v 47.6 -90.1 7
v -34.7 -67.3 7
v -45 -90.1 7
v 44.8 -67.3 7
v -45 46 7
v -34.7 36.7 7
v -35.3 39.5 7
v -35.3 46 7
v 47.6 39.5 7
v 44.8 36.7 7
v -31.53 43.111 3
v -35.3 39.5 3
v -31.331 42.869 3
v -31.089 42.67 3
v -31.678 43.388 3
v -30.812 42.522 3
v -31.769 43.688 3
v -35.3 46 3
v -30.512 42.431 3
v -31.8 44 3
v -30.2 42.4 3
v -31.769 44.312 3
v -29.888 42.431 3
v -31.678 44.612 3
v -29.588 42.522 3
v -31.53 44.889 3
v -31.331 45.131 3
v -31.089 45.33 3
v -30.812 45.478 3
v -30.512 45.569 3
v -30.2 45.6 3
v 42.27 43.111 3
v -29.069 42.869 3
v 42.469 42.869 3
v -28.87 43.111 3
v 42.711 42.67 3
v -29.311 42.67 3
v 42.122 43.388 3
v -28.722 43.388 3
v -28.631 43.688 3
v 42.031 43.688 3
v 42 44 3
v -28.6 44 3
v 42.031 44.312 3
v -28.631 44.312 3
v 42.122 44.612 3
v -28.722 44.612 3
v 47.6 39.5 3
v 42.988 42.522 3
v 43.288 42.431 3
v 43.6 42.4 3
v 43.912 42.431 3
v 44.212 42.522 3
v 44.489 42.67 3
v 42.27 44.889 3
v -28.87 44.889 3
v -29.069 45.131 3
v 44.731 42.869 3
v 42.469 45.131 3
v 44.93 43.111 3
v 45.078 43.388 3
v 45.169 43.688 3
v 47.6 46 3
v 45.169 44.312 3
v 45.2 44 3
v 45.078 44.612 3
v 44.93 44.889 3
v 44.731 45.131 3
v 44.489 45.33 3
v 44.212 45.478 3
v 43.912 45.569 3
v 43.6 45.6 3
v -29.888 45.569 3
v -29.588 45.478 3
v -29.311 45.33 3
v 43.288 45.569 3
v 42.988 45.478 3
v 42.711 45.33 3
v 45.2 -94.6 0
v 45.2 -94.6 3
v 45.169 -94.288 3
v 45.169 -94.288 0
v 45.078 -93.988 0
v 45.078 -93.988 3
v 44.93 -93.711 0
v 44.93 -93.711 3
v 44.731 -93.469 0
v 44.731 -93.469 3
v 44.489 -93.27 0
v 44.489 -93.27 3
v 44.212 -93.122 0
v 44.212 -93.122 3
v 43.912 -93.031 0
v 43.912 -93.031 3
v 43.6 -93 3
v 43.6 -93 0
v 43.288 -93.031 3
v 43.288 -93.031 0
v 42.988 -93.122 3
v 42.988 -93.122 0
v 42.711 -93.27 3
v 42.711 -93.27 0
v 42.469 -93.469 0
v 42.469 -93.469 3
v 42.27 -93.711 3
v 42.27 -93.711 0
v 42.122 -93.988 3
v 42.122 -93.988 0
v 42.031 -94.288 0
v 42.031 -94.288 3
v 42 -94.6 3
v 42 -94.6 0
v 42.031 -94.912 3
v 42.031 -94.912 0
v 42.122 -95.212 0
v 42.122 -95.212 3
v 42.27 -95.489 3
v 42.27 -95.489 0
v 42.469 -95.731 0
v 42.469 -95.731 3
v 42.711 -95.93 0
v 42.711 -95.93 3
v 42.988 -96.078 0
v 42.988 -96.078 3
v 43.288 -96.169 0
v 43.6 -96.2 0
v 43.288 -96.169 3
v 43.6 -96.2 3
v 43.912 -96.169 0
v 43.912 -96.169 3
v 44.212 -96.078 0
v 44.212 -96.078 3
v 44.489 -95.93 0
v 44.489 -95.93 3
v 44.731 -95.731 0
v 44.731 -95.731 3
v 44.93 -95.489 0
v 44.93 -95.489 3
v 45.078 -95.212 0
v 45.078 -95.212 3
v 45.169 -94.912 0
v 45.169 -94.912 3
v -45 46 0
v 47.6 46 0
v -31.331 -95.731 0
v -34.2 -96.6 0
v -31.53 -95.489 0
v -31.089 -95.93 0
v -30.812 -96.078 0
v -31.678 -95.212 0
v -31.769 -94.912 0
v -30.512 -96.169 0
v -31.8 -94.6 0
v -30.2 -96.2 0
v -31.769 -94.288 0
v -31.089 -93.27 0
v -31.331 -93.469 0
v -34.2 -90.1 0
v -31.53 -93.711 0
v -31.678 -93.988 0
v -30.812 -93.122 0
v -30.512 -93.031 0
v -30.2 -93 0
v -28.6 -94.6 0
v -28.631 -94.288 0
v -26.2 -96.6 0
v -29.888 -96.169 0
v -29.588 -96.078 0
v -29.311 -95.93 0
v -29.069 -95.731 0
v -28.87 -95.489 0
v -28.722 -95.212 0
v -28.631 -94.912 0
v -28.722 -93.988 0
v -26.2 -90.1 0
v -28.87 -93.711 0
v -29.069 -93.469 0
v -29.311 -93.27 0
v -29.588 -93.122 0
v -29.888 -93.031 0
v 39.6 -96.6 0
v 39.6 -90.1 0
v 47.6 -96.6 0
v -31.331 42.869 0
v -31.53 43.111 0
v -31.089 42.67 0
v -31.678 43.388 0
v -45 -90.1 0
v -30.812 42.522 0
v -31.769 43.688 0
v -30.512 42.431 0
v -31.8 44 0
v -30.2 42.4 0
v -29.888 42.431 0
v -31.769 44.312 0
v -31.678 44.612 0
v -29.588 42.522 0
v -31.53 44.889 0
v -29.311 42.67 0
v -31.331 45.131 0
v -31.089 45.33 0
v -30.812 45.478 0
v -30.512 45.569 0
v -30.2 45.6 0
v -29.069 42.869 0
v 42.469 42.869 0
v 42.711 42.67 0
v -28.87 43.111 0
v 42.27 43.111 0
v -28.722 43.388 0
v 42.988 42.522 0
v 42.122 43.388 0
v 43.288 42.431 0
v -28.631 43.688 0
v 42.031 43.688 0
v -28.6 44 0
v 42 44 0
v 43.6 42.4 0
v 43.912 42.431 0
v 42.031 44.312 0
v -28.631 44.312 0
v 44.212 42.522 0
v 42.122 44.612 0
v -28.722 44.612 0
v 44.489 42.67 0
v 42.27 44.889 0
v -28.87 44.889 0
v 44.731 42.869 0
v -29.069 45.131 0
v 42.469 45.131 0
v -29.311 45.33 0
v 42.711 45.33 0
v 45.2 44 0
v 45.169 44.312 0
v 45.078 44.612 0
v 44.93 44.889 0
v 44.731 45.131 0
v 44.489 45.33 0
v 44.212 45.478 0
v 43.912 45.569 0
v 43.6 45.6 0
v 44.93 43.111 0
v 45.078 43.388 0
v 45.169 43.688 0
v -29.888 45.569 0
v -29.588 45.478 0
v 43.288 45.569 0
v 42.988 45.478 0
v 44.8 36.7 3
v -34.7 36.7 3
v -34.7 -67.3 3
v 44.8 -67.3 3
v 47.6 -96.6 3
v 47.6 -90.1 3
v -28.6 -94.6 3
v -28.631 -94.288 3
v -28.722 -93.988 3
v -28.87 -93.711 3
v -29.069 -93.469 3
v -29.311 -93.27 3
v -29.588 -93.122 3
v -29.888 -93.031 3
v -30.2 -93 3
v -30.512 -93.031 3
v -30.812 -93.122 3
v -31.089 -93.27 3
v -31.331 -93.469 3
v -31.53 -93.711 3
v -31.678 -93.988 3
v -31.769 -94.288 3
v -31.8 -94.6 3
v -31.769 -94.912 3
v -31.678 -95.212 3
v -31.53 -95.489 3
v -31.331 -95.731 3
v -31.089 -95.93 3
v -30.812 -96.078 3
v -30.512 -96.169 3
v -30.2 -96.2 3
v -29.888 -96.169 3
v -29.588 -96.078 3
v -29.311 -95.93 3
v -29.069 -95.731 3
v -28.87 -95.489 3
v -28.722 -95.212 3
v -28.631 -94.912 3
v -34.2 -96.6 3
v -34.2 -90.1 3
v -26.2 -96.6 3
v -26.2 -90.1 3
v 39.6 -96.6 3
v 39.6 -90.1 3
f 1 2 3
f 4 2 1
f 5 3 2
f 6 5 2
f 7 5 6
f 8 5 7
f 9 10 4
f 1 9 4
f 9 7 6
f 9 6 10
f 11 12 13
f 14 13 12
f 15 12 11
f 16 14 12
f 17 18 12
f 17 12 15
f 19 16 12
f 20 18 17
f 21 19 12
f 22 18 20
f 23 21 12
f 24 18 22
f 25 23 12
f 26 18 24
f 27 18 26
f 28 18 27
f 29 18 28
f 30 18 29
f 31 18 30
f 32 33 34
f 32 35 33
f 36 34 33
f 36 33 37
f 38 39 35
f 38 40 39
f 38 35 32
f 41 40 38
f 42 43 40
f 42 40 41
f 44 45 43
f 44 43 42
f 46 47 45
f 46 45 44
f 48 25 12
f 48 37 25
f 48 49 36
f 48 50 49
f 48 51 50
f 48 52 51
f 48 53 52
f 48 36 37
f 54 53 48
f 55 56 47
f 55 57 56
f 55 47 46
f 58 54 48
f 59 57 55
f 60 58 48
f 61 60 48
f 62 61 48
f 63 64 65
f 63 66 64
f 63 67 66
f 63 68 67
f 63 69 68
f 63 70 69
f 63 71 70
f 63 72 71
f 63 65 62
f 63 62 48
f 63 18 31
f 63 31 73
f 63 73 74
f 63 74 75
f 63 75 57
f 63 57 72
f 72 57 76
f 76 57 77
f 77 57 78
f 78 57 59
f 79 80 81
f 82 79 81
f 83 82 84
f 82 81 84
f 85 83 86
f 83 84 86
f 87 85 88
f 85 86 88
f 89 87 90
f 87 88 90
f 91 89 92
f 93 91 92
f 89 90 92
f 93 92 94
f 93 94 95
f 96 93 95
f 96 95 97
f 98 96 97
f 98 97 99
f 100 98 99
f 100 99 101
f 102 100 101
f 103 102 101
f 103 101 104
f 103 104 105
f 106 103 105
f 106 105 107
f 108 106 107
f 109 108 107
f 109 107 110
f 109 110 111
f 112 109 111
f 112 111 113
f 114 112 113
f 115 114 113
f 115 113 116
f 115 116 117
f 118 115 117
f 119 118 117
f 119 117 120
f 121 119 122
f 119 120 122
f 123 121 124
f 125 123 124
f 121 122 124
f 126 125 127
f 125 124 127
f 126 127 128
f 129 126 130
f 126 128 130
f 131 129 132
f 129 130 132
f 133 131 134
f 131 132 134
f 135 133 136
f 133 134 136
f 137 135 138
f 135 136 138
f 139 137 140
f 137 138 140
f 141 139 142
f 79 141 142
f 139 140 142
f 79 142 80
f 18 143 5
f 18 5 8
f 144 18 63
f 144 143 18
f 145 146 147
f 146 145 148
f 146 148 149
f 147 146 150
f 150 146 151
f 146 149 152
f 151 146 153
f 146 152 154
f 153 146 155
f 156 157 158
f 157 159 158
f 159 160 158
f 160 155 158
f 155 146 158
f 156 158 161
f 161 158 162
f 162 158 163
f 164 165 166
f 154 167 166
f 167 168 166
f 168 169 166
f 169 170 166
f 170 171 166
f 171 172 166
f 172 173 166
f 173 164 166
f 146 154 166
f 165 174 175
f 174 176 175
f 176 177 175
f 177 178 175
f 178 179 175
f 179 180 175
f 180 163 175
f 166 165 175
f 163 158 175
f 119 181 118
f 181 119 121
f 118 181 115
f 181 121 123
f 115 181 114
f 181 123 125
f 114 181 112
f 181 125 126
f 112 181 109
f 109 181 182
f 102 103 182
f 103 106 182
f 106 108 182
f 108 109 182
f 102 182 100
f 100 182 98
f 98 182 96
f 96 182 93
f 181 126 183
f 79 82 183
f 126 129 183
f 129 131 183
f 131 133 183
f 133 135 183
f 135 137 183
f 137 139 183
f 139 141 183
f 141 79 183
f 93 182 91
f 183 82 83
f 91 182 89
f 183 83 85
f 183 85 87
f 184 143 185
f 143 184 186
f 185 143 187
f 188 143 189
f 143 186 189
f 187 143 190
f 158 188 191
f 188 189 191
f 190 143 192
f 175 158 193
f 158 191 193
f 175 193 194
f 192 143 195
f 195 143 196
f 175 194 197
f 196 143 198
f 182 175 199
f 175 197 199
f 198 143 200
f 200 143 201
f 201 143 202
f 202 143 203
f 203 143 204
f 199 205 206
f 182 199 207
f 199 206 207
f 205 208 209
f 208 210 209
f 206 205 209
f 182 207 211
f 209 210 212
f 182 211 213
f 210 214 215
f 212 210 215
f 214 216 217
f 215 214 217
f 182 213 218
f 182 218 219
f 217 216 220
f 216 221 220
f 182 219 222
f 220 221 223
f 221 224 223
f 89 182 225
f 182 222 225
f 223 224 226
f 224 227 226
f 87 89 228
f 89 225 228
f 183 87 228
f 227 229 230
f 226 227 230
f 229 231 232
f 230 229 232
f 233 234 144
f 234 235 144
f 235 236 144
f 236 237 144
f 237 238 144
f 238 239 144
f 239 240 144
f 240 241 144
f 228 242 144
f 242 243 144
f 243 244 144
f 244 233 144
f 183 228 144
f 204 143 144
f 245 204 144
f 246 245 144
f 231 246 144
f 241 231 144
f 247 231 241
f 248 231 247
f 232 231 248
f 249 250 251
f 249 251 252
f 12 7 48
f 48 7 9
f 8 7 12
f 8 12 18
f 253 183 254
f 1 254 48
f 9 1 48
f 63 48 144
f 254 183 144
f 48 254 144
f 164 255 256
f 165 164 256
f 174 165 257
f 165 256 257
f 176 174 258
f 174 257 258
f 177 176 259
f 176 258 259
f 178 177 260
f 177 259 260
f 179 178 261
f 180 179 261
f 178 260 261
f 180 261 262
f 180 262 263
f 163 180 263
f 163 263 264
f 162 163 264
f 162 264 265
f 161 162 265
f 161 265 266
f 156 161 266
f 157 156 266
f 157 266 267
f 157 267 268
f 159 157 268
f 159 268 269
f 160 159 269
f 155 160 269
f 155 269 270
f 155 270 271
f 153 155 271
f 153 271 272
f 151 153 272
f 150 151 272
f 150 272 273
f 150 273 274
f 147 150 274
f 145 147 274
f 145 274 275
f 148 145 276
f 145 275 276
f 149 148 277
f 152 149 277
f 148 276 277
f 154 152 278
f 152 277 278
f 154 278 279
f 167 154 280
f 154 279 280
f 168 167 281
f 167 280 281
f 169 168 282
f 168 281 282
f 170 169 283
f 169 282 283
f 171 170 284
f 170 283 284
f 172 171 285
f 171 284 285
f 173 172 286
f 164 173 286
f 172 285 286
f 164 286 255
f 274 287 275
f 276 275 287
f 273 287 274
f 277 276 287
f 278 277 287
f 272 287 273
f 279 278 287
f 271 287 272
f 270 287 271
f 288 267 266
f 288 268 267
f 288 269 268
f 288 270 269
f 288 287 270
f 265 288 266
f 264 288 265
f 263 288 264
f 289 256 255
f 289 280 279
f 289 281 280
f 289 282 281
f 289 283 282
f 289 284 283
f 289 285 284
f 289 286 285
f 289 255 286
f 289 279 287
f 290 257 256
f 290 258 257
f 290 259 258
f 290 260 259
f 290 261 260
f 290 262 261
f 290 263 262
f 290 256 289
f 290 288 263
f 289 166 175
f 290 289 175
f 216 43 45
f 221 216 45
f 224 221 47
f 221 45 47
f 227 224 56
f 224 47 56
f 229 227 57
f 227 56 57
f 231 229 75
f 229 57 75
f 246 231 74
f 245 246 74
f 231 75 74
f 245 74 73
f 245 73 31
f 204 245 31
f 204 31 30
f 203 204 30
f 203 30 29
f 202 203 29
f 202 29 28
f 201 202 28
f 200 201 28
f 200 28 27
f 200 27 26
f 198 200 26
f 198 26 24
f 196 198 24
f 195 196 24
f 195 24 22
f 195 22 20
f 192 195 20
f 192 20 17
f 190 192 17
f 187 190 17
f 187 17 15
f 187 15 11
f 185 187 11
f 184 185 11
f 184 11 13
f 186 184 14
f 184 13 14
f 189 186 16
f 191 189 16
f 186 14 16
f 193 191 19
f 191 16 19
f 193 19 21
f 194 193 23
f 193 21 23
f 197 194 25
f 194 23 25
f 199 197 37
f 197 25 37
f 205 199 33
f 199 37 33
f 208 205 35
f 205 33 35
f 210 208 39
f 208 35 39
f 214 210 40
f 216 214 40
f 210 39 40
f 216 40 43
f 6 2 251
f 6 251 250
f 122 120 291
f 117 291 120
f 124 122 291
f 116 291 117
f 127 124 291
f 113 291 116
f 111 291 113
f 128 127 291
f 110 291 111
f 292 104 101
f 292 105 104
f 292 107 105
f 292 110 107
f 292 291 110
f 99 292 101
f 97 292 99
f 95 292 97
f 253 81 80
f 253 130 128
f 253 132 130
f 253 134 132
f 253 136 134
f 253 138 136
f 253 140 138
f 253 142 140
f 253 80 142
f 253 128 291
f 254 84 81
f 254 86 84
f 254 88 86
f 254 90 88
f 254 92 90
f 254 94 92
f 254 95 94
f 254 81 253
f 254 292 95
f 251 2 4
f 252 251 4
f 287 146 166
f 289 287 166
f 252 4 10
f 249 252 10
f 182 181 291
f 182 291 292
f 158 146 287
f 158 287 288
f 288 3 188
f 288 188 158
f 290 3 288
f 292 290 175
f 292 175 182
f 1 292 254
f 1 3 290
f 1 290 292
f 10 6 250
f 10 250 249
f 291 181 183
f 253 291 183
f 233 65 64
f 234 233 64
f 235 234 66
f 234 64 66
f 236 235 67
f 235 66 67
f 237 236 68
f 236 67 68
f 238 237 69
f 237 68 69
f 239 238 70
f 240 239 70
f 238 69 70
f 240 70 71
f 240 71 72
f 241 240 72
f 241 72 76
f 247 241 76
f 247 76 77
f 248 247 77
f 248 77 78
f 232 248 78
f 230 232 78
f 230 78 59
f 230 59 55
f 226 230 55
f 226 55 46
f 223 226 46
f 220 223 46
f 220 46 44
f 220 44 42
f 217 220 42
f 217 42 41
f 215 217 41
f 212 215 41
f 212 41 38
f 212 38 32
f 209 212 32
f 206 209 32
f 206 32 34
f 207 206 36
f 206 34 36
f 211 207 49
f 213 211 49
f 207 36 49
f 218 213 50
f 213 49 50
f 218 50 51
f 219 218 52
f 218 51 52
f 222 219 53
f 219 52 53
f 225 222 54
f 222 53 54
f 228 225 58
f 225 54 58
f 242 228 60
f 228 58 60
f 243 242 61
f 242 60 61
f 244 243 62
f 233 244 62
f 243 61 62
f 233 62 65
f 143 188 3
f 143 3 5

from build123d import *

# Parameters (mm, degrees)
ESQUISSE1_W             = 92.6
ESQUISSE1_H             = 142.6
BASE_EXTRUSION_DEPTH    = 7
ESQUISSE4_R             = 1.6
ENL_V_MAT_EXTRU_2_DEPTH = 108.918117107
ESQUISSE2_W             = 79.5
ESQUISSE2_H             = 104
ENL_V_MAT_EXTRU_3_DEPTH = 4
ESQUISSE6_W             = 86.3
ESQUISSE6_H             = 9.5
ENL_V_MAT_EXTRU_4_DEPTH = 4
ESQUISSE7_W             = 120
ESQUISSE7_H             = 17.9
ENL_V_MAT_EXTRU_6_DEPTH = 4
ESQUISSE8_W             = 13.8
ESQUISSE8_H             = 8.9
ESQUISSE8_W_2           = 65.8
ENL_V_MAT_EXTRU_7_DEPTH = 15


with BuildPart() as part:
    # Esquisse1 → Base-Extrusion (new body)
    with BuildSketch(Plane.XY):
        with Locations((1.3, -25.3)):
            Rectangle(ESQUISSE1_W, ESQUISSE1_H)
    extrude(amount=BASE_EXTRUSION_DEPTH)

    # Esquisse4 → Enlèv. mat.-Extru.2 (cut, through all)
    with BuildSketch(Plane.XY.offset(7)):
        with Locations((-30.2, 44)):
            Circle(ESQUISSE4_R)
        with Locations((43.6, 44)):
            Circle(ESQUISSE4_R)
        with Locations((-30.2, -94.6)):
            Circle(ESQUISSE4_R)
        with Locations((43.6, -94.6)):
            Circle(ESQUISSE4_R)
    extrude(amount=-ENL_V_MAT_EXTRU_2_DEPTH, mode=Mode.SUBTRACT)

    # Esquisse2 → Enlèv. mat.-Extru.3 (cut)
    with BuildSketch(Plane.XY.offset(7)):
        with Locations((5.05, -15.3)):
            Rectangle(ESQUISSE2_W, ESQUISSE2_H)
    extrude(amount=-ENL_V_MAT_EXTRU_3_DEPTH, mode=Mode.SUBTRACT)

    # Esquisse6 → Enlèv. mat.-Extru.4 (cut)
    with BuildSketch(Plane.XY.offset(7)):
        with Locations((7.85, 44.25)):
            Rectangle(ESQUISSE6_W, ESQUISSE6_H)
    extrude(amount=-ENL_V_MAT_EXTRU_4_DEPTH, mode=Mode.SUBTRACT)

    # Esquisse7 → Enlèv. mat.-Extru.6 (cut)
    with BuildSketch(Plane.XY.offset(7)):
        with Locations((0, -99.05)):
            Rectangle(ESQUISSE7_W, ESQUISSE7_H)
    extrude(amount=-ENL_V_MAT_EXTRU_6_DEPTH, mode=Mode.SUBTRACT)

    # Esquisse8 → Enlèv. mat.-Extru.7 (cut)
    with BuildSketch(Plane(origin=(0, 0, 0), x_dir=(-1, 0, 0), z_dir=(0, 0, -1))):
        with Locations((41.1, -94.55)):
            Rectangle(ESQUISSE8_W, ESQUISSE8_H)
        with Locations((-6.7, -94.55)):
            Rectangle(ESQUISSE8_W_2, ESQUISSE8_H)
    extrude(amount=-ENL_V_MAT_EXTRU_7_DEPTH, mode=Mode.SUBTRACT)


solid = part.part
